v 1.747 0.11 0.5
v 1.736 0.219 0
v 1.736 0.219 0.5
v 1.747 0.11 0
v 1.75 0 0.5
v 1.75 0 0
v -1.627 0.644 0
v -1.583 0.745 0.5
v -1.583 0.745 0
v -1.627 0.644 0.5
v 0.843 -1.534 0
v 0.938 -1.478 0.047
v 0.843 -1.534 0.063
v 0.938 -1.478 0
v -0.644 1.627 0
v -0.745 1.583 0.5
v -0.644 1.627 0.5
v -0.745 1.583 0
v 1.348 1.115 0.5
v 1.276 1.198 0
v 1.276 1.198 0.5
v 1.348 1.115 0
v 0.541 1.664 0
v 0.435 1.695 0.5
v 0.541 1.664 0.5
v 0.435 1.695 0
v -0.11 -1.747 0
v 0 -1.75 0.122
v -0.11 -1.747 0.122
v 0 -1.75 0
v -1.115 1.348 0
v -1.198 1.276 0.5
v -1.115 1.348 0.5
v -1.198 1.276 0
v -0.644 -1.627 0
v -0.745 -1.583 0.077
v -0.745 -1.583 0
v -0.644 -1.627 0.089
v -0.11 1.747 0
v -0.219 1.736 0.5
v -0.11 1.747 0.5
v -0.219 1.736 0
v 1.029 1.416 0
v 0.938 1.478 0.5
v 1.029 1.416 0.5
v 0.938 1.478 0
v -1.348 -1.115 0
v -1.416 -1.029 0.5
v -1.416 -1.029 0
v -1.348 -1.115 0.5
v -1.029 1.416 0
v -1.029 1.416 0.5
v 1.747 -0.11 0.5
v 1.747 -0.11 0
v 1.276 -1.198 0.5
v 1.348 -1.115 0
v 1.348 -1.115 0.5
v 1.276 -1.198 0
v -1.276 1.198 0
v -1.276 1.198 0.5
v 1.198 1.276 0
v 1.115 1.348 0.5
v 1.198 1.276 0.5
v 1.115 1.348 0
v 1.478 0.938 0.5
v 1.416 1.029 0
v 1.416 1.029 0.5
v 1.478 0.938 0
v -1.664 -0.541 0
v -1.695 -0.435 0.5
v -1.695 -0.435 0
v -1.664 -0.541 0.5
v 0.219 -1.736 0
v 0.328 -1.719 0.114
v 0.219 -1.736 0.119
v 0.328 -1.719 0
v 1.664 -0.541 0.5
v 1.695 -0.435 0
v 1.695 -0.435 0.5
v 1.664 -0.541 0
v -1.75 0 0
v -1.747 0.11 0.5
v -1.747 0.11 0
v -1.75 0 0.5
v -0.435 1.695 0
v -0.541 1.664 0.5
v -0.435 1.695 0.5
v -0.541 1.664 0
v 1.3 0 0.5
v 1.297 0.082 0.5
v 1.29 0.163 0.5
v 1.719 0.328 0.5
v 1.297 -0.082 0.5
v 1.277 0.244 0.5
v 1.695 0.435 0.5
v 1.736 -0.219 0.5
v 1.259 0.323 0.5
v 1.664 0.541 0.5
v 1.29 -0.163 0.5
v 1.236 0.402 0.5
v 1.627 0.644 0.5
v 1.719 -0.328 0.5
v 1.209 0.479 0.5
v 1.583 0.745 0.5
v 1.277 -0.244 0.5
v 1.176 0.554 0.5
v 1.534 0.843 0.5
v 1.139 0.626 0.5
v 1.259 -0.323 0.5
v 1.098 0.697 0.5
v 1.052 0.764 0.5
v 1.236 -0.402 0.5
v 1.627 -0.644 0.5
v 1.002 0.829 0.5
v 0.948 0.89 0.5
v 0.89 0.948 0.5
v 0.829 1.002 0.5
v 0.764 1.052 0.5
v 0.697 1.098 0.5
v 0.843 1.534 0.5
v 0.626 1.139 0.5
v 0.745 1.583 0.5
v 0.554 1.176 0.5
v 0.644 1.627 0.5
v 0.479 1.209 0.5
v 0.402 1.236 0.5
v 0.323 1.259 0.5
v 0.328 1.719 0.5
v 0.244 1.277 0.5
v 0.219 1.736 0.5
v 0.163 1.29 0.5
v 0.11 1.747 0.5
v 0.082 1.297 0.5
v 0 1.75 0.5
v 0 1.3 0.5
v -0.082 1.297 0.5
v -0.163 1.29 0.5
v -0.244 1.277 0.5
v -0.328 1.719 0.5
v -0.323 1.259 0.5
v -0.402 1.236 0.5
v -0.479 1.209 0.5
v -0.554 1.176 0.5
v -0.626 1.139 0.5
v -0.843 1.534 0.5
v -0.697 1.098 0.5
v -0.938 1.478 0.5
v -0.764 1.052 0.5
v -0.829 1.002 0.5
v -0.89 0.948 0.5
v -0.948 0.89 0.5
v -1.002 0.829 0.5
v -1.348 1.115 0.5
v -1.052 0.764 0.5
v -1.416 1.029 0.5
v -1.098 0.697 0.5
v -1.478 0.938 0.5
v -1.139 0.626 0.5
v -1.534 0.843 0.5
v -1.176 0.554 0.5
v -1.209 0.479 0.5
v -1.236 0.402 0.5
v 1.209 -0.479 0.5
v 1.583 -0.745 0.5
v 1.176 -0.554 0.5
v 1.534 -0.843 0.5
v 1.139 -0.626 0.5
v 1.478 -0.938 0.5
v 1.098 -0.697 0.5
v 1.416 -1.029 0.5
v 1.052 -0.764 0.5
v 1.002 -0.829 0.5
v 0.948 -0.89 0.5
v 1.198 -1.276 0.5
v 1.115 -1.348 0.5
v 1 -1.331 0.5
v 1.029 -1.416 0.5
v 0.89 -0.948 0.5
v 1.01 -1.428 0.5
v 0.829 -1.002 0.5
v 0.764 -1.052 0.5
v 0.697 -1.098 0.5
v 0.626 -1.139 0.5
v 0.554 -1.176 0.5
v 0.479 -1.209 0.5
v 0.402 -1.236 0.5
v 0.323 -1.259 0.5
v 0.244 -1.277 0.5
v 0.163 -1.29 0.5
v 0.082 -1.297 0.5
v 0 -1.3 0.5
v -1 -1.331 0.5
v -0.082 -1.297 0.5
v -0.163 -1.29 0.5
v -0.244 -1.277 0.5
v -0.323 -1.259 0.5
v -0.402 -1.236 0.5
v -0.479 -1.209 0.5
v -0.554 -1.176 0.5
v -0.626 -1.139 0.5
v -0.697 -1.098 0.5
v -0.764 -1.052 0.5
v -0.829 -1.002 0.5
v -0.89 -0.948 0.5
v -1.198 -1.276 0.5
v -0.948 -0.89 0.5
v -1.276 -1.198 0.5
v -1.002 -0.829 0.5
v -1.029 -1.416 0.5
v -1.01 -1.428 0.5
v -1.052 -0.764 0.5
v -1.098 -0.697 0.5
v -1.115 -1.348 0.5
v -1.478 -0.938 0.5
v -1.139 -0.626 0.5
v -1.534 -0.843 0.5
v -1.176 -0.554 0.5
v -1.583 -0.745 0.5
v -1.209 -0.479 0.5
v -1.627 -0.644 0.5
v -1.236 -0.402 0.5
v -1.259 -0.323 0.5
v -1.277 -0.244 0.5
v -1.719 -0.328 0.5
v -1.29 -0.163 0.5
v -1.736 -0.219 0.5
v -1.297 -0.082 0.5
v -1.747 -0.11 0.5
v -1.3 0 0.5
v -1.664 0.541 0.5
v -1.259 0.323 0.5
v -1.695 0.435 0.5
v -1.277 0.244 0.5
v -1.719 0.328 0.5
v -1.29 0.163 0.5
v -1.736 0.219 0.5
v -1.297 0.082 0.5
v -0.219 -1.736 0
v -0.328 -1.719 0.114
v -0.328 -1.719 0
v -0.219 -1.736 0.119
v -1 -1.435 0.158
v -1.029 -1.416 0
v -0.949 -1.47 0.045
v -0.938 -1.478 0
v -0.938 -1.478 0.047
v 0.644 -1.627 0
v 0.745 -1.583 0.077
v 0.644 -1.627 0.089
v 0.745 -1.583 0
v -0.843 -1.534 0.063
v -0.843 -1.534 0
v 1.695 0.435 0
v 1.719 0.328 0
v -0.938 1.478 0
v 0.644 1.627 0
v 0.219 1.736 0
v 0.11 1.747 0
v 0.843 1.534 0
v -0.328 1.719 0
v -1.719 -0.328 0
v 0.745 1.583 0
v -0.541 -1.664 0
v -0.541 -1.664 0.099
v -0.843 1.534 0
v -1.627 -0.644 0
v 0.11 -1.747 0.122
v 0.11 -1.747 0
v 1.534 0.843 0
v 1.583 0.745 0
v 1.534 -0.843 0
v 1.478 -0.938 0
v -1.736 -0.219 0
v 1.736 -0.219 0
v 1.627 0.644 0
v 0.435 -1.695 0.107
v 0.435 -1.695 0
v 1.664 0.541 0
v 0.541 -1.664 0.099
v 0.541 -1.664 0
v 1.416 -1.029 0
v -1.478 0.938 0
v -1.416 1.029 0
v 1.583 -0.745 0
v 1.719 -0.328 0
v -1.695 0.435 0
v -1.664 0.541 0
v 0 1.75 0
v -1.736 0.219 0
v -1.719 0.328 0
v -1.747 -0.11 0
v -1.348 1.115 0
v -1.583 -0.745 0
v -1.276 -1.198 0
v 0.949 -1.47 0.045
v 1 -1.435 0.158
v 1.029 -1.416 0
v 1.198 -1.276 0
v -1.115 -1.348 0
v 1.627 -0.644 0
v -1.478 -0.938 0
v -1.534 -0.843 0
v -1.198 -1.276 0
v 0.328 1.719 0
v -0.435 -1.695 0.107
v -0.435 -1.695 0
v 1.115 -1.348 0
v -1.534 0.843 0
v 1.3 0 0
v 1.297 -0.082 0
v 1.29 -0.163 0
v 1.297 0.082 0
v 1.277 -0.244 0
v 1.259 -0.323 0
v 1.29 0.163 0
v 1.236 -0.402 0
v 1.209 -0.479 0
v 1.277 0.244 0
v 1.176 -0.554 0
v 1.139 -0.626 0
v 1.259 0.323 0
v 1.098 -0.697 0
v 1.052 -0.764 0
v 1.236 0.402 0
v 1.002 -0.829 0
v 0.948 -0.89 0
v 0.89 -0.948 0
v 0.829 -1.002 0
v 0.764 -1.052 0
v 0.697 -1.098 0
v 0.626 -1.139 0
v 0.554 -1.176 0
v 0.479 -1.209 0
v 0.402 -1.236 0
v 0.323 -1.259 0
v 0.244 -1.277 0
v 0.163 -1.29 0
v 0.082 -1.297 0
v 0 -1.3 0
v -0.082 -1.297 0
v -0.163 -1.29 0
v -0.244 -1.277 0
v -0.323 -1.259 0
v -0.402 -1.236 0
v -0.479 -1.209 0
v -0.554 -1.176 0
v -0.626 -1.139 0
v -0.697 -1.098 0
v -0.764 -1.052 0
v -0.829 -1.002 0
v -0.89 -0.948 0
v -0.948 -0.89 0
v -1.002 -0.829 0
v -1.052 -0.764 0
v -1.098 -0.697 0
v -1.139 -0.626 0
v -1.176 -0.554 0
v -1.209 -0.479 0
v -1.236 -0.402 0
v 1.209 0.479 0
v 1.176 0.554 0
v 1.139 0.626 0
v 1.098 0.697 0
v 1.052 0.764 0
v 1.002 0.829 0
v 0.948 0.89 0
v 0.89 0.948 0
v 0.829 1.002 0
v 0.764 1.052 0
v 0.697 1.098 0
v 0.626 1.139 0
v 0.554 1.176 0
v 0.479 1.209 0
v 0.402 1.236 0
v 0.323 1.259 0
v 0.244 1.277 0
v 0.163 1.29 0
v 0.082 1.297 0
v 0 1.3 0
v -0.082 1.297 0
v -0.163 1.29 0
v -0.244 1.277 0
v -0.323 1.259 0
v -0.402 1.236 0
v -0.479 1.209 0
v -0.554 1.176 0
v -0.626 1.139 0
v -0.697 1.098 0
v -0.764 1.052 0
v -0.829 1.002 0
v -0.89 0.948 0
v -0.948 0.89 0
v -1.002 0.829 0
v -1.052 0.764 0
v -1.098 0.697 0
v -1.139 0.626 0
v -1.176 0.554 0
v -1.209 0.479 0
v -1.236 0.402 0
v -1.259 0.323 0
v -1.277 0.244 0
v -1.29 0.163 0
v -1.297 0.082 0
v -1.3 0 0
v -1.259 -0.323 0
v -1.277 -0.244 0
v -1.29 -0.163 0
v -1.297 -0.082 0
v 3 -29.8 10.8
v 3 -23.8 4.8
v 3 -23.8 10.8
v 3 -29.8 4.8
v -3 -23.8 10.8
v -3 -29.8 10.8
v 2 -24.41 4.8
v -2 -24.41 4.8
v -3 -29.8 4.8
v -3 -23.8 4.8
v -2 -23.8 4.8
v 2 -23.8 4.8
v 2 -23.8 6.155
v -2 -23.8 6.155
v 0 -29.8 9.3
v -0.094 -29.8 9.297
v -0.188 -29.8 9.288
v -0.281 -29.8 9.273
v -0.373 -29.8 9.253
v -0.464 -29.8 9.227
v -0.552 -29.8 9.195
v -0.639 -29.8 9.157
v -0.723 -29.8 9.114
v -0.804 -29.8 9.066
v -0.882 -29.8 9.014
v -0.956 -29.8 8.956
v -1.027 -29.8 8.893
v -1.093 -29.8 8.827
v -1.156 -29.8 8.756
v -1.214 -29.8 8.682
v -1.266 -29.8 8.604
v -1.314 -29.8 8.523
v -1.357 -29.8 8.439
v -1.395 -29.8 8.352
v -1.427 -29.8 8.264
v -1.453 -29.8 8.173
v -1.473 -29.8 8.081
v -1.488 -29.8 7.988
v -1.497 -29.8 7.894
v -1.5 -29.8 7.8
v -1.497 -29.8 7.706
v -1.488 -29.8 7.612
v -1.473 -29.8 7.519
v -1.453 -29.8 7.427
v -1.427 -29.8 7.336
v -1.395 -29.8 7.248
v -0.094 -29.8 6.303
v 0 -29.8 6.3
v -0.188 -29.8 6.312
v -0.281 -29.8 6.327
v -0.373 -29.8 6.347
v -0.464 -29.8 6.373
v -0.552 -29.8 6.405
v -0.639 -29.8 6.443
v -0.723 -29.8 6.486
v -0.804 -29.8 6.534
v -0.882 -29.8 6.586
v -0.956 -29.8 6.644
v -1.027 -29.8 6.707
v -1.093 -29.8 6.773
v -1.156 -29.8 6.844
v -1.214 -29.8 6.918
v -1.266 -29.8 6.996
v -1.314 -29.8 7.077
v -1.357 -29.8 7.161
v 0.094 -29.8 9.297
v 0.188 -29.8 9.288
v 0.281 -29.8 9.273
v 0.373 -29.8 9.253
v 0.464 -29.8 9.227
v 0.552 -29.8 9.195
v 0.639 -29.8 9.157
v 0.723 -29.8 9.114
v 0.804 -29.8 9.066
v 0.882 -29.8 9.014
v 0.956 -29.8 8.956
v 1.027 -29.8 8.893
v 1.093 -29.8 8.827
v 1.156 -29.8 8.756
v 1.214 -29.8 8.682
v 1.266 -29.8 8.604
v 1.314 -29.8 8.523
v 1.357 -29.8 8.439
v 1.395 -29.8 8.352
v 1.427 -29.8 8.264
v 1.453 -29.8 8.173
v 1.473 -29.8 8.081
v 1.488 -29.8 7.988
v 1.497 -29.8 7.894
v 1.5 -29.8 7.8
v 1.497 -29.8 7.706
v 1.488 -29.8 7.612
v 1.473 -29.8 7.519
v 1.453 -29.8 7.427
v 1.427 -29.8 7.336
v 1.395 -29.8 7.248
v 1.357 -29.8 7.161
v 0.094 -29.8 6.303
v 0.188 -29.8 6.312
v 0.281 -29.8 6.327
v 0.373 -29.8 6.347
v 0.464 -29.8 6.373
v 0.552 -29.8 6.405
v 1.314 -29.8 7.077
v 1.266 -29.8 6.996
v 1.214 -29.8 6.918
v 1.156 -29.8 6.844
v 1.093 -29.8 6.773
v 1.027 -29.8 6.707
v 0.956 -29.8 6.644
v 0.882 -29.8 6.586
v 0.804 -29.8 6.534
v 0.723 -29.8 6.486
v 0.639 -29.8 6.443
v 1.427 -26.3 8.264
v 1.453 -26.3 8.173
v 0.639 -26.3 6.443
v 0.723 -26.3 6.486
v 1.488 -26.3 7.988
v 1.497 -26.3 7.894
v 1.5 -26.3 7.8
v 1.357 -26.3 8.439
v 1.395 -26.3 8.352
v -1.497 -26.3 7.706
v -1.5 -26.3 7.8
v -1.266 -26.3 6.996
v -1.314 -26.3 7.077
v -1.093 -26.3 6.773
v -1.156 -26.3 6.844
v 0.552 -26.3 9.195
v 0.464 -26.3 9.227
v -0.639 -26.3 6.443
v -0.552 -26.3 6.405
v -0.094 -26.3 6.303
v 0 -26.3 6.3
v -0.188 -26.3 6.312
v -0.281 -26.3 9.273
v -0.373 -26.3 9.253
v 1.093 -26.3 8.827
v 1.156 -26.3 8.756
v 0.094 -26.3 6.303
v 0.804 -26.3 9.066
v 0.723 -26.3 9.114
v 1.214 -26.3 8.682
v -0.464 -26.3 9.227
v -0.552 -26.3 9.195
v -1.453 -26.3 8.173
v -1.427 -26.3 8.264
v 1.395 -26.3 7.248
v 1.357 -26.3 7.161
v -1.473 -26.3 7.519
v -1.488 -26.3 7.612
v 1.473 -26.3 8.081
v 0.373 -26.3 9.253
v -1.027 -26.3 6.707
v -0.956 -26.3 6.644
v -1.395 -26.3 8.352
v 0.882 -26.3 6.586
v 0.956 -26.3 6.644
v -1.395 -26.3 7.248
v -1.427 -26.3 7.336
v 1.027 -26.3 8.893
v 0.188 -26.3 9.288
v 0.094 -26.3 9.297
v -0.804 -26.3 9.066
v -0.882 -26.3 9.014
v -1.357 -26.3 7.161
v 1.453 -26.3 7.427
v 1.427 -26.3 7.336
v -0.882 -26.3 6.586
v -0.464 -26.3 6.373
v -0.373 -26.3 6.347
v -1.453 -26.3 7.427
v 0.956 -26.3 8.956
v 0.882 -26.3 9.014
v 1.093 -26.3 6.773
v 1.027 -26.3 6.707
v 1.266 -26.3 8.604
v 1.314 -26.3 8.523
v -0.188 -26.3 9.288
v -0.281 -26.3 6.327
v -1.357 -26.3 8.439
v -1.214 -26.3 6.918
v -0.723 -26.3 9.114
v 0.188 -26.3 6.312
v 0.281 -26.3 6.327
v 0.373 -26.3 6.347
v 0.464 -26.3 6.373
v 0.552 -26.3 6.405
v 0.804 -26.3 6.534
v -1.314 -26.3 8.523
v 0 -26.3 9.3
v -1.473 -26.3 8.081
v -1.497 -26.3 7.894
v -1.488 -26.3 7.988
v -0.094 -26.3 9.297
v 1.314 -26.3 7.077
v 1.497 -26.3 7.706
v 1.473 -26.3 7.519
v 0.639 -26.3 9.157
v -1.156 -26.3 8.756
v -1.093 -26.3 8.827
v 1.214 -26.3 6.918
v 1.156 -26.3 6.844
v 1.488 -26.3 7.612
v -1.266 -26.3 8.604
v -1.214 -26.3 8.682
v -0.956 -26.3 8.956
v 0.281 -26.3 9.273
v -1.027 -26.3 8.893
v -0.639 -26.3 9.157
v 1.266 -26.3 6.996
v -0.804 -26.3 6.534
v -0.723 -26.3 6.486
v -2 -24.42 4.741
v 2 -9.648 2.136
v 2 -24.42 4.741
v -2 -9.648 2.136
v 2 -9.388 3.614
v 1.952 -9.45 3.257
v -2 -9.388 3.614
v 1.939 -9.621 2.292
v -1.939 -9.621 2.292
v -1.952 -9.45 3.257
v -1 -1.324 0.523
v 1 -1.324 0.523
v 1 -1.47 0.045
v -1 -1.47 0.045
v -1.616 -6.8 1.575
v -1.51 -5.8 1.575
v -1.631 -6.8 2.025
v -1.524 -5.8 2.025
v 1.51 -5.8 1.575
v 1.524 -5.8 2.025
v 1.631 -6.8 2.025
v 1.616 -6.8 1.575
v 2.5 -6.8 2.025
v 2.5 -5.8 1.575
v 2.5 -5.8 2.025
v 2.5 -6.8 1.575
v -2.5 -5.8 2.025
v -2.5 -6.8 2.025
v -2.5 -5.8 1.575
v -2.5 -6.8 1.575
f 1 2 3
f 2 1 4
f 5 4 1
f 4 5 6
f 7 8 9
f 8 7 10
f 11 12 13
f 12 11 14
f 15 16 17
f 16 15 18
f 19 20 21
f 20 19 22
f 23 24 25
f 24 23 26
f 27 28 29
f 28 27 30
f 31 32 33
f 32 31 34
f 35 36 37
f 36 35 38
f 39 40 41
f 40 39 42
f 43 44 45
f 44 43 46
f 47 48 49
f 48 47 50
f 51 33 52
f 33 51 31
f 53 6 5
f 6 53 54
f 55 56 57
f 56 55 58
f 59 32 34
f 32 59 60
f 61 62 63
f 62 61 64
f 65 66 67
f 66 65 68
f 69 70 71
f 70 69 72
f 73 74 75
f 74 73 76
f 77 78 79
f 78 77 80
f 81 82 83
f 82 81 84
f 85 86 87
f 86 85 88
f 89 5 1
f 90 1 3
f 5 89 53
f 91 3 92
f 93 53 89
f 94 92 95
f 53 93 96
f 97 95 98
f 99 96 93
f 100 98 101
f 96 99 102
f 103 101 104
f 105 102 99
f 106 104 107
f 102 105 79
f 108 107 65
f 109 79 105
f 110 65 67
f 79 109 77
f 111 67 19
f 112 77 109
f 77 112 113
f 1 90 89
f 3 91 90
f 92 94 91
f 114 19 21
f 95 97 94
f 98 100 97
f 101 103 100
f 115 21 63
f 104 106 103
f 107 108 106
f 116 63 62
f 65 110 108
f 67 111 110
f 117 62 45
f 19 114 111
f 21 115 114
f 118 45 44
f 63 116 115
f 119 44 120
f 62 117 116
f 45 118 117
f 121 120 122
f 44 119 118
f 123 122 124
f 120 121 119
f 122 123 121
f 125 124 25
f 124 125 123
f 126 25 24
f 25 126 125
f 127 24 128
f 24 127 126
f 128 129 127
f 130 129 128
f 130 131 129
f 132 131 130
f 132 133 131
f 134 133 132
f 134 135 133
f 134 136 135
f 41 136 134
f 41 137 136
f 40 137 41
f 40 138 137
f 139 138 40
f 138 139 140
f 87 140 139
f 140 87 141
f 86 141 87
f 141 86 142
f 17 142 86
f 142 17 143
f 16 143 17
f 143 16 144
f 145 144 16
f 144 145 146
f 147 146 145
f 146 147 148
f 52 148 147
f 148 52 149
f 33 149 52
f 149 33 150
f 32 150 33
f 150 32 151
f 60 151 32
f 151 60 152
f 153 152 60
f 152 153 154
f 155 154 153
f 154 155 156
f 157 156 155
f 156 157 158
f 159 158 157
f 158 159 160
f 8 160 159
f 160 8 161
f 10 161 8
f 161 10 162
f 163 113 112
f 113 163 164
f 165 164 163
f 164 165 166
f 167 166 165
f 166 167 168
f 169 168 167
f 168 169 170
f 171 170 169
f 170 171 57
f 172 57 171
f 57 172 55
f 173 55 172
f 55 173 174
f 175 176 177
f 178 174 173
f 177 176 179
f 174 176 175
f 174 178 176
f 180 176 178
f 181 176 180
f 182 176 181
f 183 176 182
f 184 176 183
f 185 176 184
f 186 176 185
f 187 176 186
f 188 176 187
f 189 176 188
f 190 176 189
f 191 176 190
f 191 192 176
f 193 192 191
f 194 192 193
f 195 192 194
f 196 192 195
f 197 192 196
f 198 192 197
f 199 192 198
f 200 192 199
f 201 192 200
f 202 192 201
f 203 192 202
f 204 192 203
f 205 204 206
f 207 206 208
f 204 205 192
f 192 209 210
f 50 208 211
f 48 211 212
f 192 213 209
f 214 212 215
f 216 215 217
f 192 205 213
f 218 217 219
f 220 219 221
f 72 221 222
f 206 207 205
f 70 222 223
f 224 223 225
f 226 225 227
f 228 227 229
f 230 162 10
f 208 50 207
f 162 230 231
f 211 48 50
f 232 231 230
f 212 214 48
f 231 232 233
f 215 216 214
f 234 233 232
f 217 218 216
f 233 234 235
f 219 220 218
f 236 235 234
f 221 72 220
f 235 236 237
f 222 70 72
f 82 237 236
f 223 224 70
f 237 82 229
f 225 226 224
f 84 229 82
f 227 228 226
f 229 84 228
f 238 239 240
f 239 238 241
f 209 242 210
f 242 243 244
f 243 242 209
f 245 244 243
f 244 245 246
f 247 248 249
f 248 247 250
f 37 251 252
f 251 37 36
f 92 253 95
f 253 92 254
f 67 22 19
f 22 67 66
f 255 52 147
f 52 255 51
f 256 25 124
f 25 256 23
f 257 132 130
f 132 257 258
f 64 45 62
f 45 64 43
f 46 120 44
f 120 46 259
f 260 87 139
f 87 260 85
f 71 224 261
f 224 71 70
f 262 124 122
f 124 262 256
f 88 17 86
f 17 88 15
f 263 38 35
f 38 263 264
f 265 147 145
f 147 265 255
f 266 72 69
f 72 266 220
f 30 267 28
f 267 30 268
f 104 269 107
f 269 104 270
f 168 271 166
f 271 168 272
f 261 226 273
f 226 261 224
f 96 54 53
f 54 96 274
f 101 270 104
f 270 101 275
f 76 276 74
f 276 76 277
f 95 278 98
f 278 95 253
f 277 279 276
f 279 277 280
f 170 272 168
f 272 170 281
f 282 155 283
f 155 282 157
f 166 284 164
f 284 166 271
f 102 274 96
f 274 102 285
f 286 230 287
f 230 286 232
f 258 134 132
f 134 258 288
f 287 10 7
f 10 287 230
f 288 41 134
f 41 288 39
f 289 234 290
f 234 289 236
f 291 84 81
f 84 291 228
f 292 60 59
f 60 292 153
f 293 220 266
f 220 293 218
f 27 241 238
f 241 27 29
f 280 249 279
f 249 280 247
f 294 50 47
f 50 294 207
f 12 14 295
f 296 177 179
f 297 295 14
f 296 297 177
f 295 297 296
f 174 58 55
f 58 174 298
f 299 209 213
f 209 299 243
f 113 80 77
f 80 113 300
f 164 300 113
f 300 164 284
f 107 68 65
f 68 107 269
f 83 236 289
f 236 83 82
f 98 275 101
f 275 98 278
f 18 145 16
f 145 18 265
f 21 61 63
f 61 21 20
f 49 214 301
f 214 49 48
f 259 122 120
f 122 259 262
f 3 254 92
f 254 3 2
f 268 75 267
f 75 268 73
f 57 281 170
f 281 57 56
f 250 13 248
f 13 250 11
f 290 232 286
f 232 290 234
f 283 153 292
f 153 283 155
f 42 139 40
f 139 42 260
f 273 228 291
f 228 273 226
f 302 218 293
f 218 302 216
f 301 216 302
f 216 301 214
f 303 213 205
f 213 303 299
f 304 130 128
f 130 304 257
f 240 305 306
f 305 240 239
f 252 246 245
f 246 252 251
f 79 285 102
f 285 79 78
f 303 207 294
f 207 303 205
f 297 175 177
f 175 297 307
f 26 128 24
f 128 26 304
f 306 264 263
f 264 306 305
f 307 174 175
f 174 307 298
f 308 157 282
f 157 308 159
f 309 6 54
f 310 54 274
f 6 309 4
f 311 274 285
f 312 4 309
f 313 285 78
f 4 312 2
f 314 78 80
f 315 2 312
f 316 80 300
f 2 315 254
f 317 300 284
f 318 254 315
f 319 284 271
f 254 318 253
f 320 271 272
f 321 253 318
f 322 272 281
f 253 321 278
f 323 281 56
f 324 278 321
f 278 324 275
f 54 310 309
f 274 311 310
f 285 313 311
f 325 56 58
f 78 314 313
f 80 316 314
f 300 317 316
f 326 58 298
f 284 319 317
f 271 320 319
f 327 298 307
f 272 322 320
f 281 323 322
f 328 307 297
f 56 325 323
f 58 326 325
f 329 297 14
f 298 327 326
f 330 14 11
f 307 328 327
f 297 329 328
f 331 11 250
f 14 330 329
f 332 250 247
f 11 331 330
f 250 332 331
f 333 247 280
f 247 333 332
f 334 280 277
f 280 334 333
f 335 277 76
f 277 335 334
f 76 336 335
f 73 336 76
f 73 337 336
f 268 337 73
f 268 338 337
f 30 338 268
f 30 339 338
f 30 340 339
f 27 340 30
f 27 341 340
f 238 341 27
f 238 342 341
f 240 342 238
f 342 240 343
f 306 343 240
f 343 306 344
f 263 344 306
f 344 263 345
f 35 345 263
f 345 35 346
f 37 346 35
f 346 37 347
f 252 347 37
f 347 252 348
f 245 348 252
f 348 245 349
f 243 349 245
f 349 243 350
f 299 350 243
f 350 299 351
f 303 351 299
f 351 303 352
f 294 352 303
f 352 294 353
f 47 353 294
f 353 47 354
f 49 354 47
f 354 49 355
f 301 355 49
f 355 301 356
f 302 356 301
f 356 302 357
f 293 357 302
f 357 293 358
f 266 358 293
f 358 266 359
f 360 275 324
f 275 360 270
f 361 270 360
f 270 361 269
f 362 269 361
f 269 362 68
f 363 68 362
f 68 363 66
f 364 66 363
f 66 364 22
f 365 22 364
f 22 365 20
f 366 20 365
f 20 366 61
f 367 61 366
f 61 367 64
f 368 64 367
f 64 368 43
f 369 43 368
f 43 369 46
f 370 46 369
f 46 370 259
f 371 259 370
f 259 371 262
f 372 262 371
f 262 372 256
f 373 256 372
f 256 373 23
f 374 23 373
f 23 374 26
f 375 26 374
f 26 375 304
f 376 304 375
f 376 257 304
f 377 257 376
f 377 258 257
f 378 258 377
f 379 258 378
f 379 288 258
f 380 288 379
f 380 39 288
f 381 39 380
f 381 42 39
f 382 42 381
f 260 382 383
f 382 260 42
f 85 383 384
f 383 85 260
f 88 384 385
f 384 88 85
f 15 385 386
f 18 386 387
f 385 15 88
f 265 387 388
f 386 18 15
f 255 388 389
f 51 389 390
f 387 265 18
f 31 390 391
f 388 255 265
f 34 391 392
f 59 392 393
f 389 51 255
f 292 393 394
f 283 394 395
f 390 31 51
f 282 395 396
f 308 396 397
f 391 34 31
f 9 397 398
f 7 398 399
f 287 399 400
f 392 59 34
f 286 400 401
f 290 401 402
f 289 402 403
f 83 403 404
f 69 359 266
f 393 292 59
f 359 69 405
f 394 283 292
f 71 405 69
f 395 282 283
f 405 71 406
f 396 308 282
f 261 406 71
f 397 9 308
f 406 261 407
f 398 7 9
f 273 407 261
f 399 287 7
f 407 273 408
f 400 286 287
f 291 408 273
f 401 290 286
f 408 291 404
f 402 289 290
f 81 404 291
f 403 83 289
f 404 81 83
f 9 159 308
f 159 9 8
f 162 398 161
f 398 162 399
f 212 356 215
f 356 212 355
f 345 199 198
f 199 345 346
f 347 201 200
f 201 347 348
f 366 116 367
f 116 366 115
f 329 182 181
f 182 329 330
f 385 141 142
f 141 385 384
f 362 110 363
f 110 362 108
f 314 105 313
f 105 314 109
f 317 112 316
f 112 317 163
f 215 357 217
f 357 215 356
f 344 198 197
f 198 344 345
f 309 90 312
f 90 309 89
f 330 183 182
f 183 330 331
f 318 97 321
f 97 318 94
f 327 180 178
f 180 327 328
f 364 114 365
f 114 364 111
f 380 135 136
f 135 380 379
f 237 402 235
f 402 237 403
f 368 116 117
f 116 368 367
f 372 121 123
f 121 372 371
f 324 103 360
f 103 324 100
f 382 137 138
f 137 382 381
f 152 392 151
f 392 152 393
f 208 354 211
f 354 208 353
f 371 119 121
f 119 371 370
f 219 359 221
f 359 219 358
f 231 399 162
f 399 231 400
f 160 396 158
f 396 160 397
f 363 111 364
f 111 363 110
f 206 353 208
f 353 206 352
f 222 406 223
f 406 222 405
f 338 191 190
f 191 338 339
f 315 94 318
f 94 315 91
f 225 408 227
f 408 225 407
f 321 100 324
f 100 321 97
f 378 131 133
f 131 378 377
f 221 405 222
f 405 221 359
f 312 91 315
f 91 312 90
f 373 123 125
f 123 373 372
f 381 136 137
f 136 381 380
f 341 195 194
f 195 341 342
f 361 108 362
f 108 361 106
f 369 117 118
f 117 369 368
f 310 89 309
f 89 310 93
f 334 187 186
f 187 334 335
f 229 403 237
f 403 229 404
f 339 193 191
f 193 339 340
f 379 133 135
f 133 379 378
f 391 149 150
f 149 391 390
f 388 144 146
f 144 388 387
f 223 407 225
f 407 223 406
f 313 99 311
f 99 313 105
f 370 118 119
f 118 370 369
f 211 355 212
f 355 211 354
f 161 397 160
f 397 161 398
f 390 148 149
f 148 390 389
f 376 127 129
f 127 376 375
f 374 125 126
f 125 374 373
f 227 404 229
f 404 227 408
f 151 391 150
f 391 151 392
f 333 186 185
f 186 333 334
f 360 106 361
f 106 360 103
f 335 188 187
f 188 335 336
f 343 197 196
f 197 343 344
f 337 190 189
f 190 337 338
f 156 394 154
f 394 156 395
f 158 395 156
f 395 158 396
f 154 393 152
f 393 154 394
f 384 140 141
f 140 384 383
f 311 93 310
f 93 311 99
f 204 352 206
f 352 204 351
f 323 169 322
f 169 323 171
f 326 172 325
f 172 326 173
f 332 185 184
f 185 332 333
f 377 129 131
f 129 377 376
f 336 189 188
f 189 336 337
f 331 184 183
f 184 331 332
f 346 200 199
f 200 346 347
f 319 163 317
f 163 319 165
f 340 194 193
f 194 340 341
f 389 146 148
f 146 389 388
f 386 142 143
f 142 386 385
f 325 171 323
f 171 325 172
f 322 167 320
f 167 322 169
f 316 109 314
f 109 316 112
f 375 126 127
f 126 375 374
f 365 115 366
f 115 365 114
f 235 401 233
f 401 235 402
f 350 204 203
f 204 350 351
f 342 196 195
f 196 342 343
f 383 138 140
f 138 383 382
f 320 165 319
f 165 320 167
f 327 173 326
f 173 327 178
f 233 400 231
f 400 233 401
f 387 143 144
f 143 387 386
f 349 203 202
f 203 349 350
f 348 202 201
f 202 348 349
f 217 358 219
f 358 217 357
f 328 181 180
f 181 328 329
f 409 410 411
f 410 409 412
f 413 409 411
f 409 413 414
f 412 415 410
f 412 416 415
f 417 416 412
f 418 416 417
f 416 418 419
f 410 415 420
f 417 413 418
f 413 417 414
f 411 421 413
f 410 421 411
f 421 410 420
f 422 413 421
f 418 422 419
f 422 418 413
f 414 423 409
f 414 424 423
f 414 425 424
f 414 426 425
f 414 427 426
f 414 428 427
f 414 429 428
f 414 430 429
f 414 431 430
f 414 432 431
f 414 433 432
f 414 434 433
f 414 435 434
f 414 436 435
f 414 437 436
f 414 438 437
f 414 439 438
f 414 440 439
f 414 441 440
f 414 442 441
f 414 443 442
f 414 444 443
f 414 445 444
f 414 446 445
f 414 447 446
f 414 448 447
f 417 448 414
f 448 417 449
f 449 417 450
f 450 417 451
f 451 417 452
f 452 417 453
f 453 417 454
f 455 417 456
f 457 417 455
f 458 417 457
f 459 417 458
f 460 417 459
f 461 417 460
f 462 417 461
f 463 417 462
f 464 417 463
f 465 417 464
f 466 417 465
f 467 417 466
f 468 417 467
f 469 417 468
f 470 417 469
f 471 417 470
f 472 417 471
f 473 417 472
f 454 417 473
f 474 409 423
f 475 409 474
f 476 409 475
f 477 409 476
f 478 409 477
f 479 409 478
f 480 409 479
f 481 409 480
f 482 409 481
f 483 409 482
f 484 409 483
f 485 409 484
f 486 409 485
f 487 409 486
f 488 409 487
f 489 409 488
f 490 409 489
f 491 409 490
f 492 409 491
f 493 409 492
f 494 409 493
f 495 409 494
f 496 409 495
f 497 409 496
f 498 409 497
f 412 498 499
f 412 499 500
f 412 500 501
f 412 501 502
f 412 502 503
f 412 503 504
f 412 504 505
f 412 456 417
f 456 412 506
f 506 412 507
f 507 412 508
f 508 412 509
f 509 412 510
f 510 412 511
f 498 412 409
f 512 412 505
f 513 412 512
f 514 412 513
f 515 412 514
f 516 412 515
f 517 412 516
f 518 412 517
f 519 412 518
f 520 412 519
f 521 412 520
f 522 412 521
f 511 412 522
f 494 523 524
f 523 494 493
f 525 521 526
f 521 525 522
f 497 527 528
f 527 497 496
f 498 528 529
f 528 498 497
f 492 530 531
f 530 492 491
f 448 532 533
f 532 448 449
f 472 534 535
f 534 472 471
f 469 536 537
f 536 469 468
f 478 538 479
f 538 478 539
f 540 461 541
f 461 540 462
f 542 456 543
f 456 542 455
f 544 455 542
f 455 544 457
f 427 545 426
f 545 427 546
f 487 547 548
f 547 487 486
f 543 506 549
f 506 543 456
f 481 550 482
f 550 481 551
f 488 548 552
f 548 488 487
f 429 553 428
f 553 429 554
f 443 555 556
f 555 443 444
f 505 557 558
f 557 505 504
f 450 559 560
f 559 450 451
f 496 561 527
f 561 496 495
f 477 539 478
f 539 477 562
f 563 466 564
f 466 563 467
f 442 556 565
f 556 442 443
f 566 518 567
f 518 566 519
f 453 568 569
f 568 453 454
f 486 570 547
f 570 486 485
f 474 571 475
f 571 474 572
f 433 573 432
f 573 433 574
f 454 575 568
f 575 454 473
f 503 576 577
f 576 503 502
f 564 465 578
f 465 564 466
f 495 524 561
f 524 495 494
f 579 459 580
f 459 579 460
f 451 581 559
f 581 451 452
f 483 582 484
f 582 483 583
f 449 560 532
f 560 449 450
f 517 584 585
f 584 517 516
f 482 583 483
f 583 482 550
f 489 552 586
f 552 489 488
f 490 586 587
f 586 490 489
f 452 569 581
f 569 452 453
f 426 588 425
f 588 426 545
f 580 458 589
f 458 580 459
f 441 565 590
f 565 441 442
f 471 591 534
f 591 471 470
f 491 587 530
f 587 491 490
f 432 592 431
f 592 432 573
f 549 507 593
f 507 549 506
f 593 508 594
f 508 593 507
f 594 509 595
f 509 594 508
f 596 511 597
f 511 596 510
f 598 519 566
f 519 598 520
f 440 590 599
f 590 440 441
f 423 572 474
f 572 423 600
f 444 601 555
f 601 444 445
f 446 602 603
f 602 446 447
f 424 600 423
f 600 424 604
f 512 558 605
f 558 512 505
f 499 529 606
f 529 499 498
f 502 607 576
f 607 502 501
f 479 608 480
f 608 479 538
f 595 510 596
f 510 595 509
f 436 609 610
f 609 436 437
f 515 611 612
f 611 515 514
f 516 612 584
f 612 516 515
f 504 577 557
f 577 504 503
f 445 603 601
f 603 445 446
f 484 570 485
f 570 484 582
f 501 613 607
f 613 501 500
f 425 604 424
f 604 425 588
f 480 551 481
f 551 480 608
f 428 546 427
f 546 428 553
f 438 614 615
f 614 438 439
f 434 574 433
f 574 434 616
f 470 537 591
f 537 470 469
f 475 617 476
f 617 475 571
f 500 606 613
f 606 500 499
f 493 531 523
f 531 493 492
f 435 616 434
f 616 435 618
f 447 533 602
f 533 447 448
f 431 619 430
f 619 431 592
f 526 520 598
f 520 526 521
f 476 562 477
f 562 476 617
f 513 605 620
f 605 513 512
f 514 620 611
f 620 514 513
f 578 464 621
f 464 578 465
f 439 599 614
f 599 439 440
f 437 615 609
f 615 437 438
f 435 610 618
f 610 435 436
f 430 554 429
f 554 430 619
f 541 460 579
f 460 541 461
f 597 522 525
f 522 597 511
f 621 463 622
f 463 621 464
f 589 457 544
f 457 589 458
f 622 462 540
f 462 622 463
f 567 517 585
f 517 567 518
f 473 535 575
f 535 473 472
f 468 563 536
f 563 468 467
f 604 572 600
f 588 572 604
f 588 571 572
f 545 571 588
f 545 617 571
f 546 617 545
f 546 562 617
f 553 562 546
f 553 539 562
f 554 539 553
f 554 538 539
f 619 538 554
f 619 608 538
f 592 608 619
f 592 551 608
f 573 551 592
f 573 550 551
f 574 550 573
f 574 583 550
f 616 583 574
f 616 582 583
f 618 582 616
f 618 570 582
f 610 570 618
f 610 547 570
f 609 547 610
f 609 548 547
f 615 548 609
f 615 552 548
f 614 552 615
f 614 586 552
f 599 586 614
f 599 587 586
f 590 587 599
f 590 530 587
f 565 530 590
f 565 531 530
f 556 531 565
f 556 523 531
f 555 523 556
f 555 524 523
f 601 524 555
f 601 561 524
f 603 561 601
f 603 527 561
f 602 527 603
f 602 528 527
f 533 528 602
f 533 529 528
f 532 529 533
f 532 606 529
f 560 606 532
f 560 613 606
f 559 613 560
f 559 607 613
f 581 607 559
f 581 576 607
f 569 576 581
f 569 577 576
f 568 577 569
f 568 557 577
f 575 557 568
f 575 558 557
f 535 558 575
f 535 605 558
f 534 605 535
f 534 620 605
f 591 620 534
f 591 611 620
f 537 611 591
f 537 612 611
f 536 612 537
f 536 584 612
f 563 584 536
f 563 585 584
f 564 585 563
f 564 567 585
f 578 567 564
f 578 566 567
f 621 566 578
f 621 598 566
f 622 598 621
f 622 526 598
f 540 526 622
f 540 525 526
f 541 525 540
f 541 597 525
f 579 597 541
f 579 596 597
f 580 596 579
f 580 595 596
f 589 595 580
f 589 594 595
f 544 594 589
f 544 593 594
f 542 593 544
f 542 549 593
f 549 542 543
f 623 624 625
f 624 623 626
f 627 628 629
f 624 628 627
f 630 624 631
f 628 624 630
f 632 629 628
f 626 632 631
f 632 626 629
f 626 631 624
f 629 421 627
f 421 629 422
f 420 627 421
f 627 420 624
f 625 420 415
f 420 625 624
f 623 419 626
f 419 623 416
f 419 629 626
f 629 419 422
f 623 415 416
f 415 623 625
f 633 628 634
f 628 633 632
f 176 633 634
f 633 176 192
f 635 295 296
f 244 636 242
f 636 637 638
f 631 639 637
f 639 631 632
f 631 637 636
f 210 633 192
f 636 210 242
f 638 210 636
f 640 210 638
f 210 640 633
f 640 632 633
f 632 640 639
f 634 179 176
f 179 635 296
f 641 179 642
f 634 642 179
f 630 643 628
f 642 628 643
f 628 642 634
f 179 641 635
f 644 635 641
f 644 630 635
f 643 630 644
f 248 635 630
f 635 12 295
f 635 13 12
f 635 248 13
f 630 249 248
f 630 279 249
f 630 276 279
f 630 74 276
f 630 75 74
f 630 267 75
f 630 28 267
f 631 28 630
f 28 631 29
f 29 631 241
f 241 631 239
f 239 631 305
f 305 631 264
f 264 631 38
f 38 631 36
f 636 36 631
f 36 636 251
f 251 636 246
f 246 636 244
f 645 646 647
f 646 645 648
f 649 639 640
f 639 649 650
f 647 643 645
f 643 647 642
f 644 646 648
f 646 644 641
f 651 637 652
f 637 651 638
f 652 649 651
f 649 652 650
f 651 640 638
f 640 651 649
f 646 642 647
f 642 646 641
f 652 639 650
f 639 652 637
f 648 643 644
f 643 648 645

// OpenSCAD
//Circular Thymus Holder
//Glass CoverSlip Diameter = 3mm
$fn=100;

//Height of ring
//height = .5;
height = 0.3;
height2 = 0.5;

//difference = .45

//1.5mm outer edge
//outer edge
//diameter = 1.25;
//diameter2 = 1.25;
diameter = 1.75;
diameter2 = diameter;

//inner edge
reduced_diameter = diameter - 0.45;

//box height
l_c2 = 6;

//hole
hole=3;


//base circle
module BaseRing(){
    difference(){
        cylinder(height2,r1=diameter,r2=diameter2);
        cylinder(height2,r=reduced_diameter);
    };
}

//Extension Arm
module ExtArm(){
    widthEA = 2;
    widthHalf = widthEA / 2;
    translate([-widthHalf,-10,3]){
        rotate([-20,0,0]){
            cube([widthEA,9,height2]);
        };
    };
};

module ExtArm2(){
    widthEA = 2;
    widthHalf = widthEA / 2;
    translate([0,-5.7,1.6]){
        rotate([73,0,0]){
            linear_extrude(height=9,center=true,scale=2)
            square([widthEA,0.5],center=true);
        };
    };
};

//End Piece
module EndPiece(){
    translate([0,0.2,0.4]){
        //Extension arm
        rotate([-10,0,0]){
          translate([0,-17.5,.75]){
            cube([4,15,1.5],center=true);
          };  
        };

        //connection post
        difference(){
            translate([0,-27,7.4]){
                cube([l_c2,l_c2,l_c2],center=true);
            };
            translate([0,-26.5,7.4]){
                   rotate([90,0,0]){
                        cylinder(6,d=hole);
                };
            };
        };
    };
};

//Height Marker
module HeightMarker(){
    translate([0,-6.3,1.8]){
        cube([5,1,.45],center=true);
    }
};

Dist1 = 3.5;
module ObjectiveModel(){
    //diameterO1 = 6.2;
    //diameterO2 = 9.7;
    diameterO1 = 7;
    diameterO2 = 14.6;
    diameterO3 = 15.7;
    
    heightO1 = 41.5-37.7;
    heightO2 = 2.5;
    
    cylinder(h=heightO1,d1=diameterO1,d2=diameterO2);
    translate([0,0,heightO1]){
        cylinder(h=heightO2,d1=diameterO2,d2 = diameterO3);
    };
   
    translate([0,0,-Dist1]){
        cube([0.3,0.3,0.1],center=true);
    };
};

Dist2 = 2;
module ObjectiveModel2(){
    diameterO1 = 6.2;
    diameterO2 = 9.7;
    diameterO3 = 15.7;
    
    heightO1 = 1.3;
    heightO2 = 2.5;
    
    cylinder(h=heightO1,d1=diameterO1,d2=diameterO2);
    translate([0,0,heightO1]){
        cylinder(h=heightO2,d1=diameterO2,d2 = diameterO3);
    };
   
    translate([0,0,-Dist2]){
        cube([0.3,0.3,0.1],center=true);
    };
};

BaseRing();
ExtArm2();
EndPiece();
HeightMarker();

translate([0,0,Dist1]){
    //ObjectiveModel();
};
translate([0,0,Dist2]){
    //ObjectiveModel2();
};
